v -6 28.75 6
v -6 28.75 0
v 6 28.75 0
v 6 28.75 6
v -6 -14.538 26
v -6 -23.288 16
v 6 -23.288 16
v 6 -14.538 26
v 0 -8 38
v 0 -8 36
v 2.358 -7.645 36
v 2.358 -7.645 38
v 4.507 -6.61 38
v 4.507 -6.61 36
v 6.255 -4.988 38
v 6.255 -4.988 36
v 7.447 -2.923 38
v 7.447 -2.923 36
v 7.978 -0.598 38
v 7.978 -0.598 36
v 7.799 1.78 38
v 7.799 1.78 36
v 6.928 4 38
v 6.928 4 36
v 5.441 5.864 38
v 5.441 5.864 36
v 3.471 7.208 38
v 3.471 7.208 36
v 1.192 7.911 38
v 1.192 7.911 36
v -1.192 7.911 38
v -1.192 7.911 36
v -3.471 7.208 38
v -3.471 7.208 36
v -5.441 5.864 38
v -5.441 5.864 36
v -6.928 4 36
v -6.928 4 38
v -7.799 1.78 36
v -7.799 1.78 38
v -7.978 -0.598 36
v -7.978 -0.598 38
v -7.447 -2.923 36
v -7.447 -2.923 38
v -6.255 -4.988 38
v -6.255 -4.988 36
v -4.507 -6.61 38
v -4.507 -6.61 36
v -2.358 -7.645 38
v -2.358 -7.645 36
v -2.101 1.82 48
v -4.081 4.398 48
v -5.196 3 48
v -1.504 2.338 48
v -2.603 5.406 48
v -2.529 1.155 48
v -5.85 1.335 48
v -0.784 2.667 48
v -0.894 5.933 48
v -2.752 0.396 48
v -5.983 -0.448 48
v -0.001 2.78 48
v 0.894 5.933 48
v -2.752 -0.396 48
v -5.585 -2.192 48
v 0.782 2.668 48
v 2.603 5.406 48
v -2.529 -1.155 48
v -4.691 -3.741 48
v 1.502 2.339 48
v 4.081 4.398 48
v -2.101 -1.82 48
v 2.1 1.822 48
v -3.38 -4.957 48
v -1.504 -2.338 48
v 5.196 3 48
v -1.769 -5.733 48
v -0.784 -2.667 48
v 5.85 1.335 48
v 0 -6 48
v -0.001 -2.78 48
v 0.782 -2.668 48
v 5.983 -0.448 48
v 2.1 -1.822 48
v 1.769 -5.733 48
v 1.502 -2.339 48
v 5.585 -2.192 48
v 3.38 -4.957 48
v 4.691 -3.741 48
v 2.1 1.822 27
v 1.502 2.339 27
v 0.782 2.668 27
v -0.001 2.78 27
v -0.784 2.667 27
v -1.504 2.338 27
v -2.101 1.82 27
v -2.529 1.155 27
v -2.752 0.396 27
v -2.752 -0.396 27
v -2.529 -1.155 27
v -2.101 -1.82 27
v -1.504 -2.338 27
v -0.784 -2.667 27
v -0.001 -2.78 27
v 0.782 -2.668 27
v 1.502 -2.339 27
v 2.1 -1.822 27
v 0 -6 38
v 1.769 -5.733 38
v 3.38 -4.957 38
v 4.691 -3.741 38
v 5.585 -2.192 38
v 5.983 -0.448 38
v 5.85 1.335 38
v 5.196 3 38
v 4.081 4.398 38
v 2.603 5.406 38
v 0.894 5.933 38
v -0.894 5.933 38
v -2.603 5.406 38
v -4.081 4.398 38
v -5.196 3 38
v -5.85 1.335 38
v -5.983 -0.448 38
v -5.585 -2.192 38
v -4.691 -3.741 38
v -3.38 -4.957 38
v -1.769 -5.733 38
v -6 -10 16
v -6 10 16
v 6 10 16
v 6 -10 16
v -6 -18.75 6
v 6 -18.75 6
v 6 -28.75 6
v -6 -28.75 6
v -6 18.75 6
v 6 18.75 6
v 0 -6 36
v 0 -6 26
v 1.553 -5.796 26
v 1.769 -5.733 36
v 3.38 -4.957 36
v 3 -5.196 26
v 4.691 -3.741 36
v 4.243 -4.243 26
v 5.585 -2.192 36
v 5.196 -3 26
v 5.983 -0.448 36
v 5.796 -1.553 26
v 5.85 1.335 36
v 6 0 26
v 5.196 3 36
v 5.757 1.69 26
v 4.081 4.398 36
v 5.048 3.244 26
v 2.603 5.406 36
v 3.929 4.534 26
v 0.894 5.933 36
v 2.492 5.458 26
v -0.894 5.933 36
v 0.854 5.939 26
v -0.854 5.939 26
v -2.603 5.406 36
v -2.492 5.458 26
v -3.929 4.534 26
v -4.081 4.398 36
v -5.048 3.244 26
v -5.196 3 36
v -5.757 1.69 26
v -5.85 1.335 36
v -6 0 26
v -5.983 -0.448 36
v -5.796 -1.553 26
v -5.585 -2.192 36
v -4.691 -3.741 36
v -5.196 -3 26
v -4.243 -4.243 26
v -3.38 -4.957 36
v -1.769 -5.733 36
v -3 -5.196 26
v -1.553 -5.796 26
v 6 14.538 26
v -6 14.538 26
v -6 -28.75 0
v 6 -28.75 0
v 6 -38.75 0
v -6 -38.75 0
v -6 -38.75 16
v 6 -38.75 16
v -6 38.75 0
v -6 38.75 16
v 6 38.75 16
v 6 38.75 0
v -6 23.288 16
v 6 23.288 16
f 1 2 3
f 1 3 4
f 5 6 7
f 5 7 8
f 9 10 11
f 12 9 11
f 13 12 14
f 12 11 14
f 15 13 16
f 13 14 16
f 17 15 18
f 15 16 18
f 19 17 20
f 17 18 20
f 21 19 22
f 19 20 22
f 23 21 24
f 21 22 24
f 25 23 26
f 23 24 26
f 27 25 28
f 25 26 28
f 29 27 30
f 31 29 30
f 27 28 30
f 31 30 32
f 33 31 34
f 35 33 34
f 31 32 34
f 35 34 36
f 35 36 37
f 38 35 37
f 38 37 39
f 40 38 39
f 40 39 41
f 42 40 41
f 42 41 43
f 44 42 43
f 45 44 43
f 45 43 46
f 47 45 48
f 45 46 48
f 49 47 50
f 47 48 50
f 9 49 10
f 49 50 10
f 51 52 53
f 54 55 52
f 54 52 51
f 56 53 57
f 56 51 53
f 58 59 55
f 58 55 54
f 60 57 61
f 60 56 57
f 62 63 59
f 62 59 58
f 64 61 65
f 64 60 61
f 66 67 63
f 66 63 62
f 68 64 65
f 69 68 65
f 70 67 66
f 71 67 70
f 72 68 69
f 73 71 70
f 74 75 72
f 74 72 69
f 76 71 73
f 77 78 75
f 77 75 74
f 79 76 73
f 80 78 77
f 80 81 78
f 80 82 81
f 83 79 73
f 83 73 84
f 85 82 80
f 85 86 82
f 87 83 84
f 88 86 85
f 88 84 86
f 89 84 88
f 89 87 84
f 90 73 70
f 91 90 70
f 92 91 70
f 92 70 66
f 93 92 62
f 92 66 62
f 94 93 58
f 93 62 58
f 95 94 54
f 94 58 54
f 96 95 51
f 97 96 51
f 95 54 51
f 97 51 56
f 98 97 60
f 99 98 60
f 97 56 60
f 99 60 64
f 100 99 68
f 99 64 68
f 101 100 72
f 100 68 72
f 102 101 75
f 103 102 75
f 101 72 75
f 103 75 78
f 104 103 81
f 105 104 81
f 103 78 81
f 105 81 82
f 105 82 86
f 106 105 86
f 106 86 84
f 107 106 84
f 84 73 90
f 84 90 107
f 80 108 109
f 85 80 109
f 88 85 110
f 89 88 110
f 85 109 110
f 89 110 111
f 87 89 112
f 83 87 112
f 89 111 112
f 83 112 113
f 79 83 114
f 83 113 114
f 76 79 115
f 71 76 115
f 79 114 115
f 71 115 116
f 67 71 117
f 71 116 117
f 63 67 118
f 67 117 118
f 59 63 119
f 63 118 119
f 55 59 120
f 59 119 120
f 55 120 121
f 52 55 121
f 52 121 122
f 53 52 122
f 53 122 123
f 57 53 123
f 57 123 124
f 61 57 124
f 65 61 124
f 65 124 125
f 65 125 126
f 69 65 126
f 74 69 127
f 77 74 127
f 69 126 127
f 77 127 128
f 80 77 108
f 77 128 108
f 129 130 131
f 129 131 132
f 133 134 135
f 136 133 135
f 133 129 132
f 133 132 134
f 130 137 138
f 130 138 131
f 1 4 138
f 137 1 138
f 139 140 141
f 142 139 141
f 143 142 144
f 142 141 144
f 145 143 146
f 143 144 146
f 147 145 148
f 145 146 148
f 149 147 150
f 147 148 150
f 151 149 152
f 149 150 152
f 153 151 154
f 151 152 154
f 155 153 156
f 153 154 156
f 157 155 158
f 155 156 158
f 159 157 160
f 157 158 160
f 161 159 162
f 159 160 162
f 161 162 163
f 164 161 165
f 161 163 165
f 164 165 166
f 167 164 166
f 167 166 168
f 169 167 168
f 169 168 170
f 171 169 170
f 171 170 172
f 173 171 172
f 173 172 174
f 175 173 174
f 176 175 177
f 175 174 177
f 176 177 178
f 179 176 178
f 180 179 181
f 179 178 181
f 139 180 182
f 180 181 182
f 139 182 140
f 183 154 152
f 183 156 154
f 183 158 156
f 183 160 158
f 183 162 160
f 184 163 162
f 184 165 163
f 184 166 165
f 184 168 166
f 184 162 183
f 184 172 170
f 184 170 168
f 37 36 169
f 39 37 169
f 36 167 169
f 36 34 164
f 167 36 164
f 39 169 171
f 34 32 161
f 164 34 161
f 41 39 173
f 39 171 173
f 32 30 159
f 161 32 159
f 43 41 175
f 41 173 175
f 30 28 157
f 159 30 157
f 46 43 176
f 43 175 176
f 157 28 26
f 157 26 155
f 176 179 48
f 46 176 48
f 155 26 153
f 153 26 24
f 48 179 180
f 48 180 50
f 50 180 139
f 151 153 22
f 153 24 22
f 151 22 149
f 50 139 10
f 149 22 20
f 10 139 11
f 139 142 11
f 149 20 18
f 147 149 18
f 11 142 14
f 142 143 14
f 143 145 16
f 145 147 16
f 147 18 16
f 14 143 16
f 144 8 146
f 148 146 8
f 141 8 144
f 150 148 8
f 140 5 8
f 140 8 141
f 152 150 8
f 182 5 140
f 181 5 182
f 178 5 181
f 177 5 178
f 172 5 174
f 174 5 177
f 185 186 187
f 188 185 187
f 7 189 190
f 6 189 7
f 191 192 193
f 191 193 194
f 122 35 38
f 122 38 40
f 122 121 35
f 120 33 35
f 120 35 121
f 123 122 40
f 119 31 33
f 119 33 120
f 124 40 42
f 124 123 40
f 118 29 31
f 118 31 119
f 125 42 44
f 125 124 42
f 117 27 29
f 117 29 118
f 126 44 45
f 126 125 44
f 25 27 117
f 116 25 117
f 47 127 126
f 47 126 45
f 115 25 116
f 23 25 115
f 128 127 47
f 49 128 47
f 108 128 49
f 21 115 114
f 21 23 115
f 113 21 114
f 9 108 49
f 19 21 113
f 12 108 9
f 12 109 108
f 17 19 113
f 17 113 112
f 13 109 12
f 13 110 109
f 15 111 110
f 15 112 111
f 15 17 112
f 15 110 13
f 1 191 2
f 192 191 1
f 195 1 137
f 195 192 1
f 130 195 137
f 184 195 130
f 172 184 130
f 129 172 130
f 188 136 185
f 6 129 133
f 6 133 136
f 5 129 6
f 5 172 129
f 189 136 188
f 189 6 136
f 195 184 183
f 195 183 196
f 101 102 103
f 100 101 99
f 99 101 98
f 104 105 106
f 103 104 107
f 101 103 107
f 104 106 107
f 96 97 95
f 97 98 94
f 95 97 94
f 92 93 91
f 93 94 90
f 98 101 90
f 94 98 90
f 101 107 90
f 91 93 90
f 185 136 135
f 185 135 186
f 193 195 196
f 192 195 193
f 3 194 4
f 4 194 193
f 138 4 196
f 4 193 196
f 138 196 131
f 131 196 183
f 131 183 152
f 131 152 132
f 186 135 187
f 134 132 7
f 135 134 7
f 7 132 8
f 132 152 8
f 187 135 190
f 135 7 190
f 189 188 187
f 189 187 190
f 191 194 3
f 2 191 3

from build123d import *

# Parameters (mm, degrees)
PAD_DEPTH    = 12
SKETCH002_R  = 6
PAD001_DEPTH = 10
SKETCH003_R  = 8
PAD002_DEPTH = 2
SKETCH004_R  = 6
PAD003_DEPTH = 10
POCKET_DEPTH = 21


with BuildPart() as part:
    # Sketch → Pad (new body)
    with BuildSketch(Plane.YZ.offset(-6)):
        Polygon((-38.75, 0), (-38.75, 16), (-23.287682, 16), (-14.537682, 26), (14.537682, 26), (23.287682, 16), (38.75, 16), (38.75, 0), (28.75, 0), (28.75, 6), (18.75, 6), (10, 16), (-10, 16), (-18.75, 6), (-28.75, 6), (-28.75, 0), align=None)
    extrude(amount=PAD_DEPTH)

    # Sketch002 → Pad001 (new body)
    with BuildSketch(Plane(origin=(-6, 0, 26), x_dir=(0, -1, 0), z_dir=(0, 0, 1))):
        with Locations((0, 6)):
            Circle(SKETCH002_R)
    extrude(amount=PAD001_DEPTH)

    # Sketch003 → Pad002 (new body)
    with BuildSketch(Plane(origin=(-6, 0, 36), x_dir=(0, -1, 0), z_dir=(0, 0, 1))):
        with Locations((0, 6)):
            Circle(SKETCH003_R)
    extrude(amount=PAD002_DEPTH)

    # Sketch004 → Pad003 (new body)
    with BuildSketch(Plane(origin=(-6, 0, 38), x_dir=(0, -1, 0), z_dir=(0, 0, 1))):
        with Locations((0, 6)):
            Circle(SKETCH004_R)
    extrude(amount=PAD003_DEPTH)

    # Sketch005 → Pocket (cut)
    with BuildSketch(Plane(origin=(-6, 0, 48), x_dir=(0, -1, 0), z_dir=(0, 0, 1))):
        with BuildLine():
            Line((-1.821648, 8.1), (1.821648, 8.1))
            ThreePointArc((-1.821648, 8.1), (0, 3.22), (1.821648, 8.1))
        make_face()
    extrude(amount=-POCKET_DEPTH, mode=Mode.SUBTRACT)


solid = part.part
